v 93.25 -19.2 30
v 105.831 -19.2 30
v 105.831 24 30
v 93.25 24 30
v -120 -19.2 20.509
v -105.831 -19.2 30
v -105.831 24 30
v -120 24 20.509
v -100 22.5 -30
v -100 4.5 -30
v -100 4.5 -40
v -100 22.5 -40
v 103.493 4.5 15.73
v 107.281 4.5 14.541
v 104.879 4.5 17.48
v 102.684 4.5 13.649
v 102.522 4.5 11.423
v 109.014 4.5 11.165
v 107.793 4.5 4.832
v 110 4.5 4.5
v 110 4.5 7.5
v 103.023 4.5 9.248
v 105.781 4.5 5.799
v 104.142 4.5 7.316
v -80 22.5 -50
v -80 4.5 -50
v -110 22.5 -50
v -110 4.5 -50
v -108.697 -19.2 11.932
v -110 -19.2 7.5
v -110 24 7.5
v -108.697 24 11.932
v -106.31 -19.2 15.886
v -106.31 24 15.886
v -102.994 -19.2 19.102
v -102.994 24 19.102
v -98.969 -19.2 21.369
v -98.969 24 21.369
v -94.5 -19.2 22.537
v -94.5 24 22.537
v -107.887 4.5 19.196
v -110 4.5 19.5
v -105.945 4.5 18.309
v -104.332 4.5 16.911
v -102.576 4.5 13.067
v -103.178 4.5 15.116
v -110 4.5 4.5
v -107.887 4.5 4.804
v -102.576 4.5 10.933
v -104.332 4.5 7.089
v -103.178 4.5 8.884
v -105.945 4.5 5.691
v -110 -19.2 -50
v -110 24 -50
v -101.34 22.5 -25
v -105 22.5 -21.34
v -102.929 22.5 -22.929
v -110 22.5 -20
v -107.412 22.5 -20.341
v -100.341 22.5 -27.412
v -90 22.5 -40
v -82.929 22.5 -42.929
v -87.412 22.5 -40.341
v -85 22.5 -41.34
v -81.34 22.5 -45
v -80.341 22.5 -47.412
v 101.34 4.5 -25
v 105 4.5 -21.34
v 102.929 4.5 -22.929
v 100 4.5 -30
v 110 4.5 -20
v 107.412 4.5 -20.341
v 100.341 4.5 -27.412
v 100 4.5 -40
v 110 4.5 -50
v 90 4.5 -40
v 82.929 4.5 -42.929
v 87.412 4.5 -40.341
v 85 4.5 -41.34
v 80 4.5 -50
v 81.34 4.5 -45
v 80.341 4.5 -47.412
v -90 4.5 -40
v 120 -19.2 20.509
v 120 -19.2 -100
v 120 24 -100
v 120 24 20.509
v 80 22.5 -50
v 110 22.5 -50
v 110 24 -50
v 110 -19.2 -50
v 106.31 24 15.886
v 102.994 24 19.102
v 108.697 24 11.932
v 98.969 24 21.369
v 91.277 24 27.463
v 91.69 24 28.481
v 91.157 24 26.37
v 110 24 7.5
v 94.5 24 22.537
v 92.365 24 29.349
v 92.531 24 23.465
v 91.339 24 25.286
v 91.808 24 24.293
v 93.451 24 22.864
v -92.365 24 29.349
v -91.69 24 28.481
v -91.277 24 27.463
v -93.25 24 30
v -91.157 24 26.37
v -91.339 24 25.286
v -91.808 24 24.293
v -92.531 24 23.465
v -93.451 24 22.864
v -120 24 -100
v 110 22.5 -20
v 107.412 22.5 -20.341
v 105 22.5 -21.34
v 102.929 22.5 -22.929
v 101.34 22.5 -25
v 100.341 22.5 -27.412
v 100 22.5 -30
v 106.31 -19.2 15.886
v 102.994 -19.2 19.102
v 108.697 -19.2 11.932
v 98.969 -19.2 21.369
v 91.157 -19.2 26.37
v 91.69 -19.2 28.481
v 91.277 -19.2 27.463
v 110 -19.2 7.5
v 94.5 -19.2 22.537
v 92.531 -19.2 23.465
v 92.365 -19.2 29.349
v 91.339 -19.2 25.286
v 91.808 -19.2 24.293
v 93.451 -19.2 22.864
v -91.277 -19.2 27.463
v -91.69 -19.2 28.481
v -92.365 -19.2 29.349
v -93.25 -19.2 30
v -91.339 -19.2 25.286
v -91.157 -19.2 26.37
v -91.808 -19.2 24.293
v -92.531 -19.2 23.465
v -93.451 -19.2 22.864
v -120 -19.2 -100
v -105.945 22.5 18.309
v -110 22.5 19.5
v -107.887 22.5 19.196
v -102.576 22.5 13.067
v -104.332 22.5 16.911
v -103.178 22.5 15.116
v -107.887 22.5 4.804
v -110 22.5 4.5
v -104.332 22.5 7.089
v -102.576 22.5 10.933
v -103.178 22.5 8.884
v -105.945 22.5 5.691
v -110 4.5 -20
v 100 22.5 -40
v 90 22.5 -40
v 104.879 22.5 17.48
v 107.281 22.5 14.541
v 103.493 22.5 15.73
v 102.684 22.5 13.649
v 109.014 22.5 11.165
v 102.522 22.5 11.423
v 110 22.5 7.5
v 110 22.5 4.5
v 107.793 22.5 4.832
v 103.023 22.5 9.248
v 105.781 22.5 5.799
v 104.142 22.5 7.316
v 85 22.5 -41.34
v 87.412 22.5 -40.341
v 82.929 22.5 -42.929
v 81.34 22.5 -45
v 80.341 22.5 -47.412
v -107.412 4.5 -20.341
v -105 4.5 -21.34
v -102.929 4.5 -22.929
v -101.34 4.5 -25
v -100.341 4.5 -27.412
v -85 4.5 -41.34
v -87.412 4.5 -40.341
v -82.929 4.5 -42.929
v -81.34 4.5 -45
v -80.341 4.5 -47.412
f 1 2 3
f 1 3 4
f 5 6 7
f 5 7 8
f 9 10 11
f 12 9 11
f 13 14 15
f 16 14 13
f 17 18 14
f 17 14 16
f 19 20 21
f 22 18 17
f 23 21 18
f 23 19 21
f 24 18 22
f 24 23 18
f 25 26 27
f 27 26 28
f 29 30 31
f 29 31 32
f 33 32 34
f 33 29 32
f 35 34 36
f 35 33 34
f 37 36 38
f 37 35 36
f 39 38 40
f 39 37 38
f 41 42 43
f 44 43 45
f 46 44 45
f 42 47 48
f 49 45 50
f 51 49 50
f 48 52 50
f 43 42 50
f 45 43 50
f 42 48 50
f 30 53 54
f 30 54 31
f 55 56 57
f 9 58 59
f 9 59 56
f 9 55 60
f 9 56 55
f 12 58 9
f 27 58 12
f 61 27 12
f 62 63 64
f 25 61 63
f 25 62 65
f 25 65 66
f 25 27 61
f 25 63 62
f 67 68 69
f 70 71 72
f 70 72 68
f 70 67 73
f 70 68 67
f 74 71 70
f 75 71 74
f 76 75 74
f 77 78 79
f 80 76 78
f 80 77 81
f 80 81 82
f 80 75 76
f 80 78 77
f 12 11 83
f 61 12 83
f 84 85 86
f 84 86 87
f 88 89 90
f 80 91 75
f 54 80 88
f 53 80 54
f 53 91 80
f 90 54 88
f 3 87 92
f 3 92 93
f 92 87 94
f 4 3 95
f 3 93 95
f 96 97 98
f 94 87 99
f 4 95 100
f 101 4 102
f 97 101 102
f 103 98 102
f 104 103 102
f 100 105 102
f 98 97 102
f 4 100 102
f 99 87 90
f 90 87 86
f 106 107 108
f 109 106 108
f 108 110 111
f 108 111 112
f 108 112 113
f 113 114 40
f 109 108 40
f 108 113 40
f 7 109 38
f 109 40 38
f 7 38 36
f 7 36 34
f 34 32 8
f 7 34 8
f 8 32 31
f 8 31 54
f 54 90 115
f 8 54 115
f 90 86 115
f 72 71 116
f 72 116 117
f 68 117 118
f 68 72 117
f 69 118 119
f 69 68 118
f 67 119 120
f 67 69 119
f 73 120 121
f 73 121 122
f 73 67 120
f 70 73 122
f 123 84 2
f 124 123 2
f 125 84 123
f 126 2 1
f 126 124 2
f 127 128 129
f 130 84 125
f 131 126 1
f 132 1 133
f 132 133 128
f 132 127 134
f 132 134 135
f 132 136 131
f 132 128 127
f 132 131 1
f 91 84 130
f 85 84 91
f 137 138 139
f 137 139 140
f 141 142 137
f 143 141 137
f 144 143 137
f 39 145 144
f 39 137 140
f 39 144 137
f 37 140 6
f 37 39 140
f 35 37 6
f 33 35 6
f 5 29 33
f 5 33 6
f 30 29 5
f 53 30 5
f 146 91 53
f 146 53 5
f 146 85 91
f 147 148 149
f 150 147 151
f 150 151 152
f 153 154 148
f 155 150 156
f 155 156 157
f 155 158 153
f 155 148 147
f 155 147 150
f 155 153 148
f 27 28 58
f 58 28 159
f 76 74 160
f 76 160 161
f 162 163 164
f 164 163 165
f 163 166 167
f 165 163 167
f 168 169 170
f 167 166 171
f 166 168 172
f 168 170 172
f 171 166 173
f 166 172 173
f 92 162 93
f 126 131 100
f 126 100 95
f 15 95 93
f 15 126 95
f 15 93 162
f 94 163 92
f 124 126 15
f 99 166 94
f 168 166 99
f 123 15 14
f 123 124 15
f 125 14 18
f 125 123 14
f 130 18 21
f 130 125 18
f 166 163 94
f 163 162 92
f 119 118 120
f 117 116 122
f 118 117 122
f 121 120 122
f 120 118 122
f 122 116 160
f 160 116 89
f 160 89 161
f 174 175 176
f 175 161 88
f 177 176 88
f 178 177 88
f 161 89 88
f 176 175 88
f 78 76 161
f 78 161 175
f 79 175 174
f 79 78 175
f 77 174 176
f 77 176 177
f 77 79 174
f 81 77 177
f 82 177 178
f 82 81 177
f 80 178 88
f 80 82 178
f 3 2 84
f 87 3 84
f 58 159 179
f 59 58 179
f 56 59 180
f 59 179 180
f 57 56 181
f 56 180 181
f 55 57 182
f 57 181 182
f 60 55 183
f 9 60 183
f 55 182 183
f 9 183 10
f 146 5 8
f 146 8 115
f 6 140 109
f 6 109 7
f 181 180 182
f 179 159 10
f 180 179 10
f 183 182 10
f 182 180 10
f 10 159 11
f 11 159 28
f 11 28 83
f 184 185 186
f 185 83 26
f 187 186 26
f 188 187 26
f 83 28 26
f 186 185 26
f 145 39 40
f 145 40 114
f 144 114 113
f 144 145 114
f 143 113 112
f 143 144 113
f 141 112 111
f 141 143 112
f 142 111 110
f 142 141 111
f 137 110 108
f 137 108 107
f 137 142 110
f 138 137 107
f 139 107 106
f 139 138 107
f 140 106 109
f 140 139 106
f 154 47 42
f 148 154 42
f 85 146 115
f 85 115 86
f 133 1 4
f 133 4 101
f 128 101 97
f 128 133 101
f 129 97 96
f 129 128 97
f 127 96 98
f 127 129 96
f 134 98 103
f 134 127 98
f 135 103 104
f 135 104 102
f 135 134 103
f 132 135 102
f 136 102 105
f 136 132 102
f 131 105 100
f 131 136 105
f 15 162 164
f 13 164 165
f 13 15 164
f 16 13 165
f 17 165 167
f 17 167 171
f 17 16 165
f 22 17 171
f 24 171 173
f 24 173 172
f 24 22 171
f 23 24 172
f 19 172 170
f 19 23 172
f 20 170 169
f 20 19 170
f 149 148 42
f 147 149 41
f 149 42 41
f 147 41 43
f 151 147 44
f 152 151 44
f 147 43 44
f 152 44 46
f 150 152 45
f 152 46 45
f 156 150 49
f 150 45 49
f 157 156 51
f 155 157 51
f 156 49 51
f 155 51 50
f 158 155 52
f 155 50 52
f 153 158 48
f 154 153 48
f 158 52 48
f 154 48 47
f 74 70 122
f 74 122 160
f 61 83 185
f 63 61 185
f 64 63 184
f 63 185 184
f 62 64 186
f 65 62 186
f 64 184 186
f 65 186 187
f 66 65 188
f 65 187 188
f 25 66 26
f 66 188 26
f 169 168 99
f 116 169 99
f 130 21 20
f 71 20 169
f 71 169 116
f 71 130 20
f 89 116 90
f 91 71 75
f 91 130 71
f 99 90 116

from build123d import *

# Parameters (mm, degrees)
BOSS_EXTRUDE1_START   = -19.2
BOSS_EXTRUDE1_DEPTH   = 43.2
SKETCH4_W             = 194
SKETCH4_H             = 38
CUT_EXTRUDE1_DEPTH    = 41.2
CUT_EXTRUDE2_DEPTH    = 21
SKETCH7_R             = 8
CUT_EXTRUDE3_DEPTH    = 21
BOSS_EXTRUDE3_DEPTH   = 18
BOSS_EXTRUDE3_2_DEPTH = 18


with BuildPart() as part:
    # Sketch1 → Boss-Extrude1 (new body)
    with BuildSketch(Plane(origin=(0, 0, 0), x_dir=(1, 0, 0), z_dir=(0, 1, 0)).offset(BOSS_EXTRUDE1_START)):
        with BuildLine():
            Line((-110, 50), (-110, -7.5))
            ThreePointArc((-110, -7.5), (-104.755451902, -17.601037804), (-94.5, -22.536820999))
            ThreePointArc((-94.5, -22.536820999), (-91.210601206, -25.822153148), (-93.25, -30))
            Line((-93.25, -30), (-105.831019797, -30))
            Line((-105.831019797, -30), (-120, -20.509486036))
            Line((-120, -20.509486036), (-120, 50))
            Line((-120, 50), (-120, 100))
            Line((-120, 100), (120, 100))
            Line((120, 100), (120, 50))
            Line((120, 50), (120, -8.2))
            Line((120, -8.2), (105.831019797, -30))
            Line((105.831019797, -30), (93.25, -30))
            ThreePointArc((93.25, -30), (91.210601206, -25.822153148), (94.5, -22.536820999))
            ThreePointArc((94.5, -22.536820999), (104.755451902, -17.601037804), (110, -7.5))
            Line((110, -7.5), (110, 50))
            Line((110, 50), (-110, 50))
        make_face()
    boss_extrude1 = extrude(amount=BOSS_EXTRUDE1_DEPTH)

    # Sketch4 → Cut-Extrude1 (cut)
    with BuildSketch(Plane(origin=(0, 24, 0), x_dir=(1, 0, 0), z_dir=(0, 1, 0))):
        with Locations((0, 75)):
            Rectangle(SKETCH4_W, SKETCH4_H)
    extrude(amount=-CUT_EXTRUDE1_DEPTH, mode=Mode.SUBTRACT)

    # Sketch5 → Cut-Extrude2 (cut)
    with BuildSketch(Plane(origin=(-97, 0, 0), x_dir=(0, 0, -1), z_dir=(1, 0, 0))):
        with BuildLine():
            Line((79.502499306, 11.5), (88.035, 11.5))
            Line((88.035, 11.5), (88.035, -11.5))
            Line((88.035, -11.5), (79.502499306, -11.5))
            ThreePointArc((79.502499306, -11.5), (75, -12.35), (70.497500694, -11.5))
            Line((70.497500694, -11.5), (61.965, -11.5))
            Line((61.965, -11.5), (61.965, 11.5))
            Line((61.965, 11.5), (70.497500694, 11.5))
            ThreePointArc((70.497500694, 11.5), (75, 12.35), (79.502499306, 11.5))
        make_face()
    cut_extrude2 = extrude(amount=-CUT_EXTRUDE2_DEPTH, mode=Mode.SUBTRACT)

    # Sketch7 → Cut-Extrude3 (cut)
    with BuildSketch(Plane(origin=(-118, 0, 0), x_dir=(0, 0, -1), z_dir=(1, 0, 0))):
        with Locations((75, 0)):
            Circle(SKETCH7_R)
    cut_extrude3 = extrude(amount=-CUT_EXTRUDE3_DEPTH, mode=Mode.SUBTRACT)

    # Mirror1: Cut-Extrude2, Cut-Extrude3 across plane
    add(cut_extrude2.mirror(Plane(origin=(0, 0, 0), x_dir=(0, 0, 1), z_dir=(1, 0, 0))), mode=Mode.SUBTRACT)
    add(cut_extrude3.mirror(Plane(origin=(0, 0, 0), x_dir=(0, 0, 1), z_dir=(1, 0, 0))), mode=Mode.SUBTRACT)

    # Mirror4: Boss-Extrude1 across plane
    add(boss_extrude1.mirror(Plane(origin=(0, 0, 0), x_dir=(0, 0, 1), z_dir=(1, 0, 0))))


with BuildPart() as body_2:
    # Sketch8 → Boss-Extrude3 (new body)
    with BuildSketch(Plane(origin=(0, 4.5, 0), x_dir=(1, 0, 0), z_dir=(0, 1, 0))):
        with BuildLine():
            Line((-110, -4.5), (-110, -19.5))
            ThreePointArc((-110, -19.5), (-102.5, -12), (-110, -4.5))
        make_face()
    boss_extrude3 = extrude(amount=BOSS_EXTRUDE3_DEPTH)


with BuildPart() as body_3:
    # Sketch8 → Boss-Extrude3 2 (new body)
    with BuildSketch(Plane(origin=(0, 4.5, 0), x_dir=(1, 0, 0), z_dir=(0, 1, 0))):
        with BuildLine():
            Line((-80, 50), (-90, 50))
            Line((-90, 50), (-110, 50))
            Line((-110, 50), (-110, 30))
            Line((-110, 30), (-110, 20))
            ThreePointArc((-110, 20), (-102.928932188, 22.928932188), (-100, 30))
            Line((-100, 30), (-100, 40))
            Line((-100, 40), (-90, 40))
            ThreePointArc((-90, 40), (-82.928932188, 42.928932188), (-80, 50))
        make_face()
    boss_extrude3_2 = extrude(amount=BOSS_EXTRUDE3_2_DEPTH)


with BuildPart() as part_1:
    add(part.part)

    # Mirror2: Boss-Extrude3, Boss-Extrude3 2 across plane
    add(boss_extrude3.mirror(Plane(origin=(0, 0, 0), x_dir=(0, 0, 1), z_dir=(1, 0, 0))))
    add(boss_extrude3_2.mirror(Plane(origin=(0, 0, 0), x_dir=(0, 0, 1), z_dir=(1, 0, 0))))


solid = Compound([body_2.part, body_3.part, part_1.part])
